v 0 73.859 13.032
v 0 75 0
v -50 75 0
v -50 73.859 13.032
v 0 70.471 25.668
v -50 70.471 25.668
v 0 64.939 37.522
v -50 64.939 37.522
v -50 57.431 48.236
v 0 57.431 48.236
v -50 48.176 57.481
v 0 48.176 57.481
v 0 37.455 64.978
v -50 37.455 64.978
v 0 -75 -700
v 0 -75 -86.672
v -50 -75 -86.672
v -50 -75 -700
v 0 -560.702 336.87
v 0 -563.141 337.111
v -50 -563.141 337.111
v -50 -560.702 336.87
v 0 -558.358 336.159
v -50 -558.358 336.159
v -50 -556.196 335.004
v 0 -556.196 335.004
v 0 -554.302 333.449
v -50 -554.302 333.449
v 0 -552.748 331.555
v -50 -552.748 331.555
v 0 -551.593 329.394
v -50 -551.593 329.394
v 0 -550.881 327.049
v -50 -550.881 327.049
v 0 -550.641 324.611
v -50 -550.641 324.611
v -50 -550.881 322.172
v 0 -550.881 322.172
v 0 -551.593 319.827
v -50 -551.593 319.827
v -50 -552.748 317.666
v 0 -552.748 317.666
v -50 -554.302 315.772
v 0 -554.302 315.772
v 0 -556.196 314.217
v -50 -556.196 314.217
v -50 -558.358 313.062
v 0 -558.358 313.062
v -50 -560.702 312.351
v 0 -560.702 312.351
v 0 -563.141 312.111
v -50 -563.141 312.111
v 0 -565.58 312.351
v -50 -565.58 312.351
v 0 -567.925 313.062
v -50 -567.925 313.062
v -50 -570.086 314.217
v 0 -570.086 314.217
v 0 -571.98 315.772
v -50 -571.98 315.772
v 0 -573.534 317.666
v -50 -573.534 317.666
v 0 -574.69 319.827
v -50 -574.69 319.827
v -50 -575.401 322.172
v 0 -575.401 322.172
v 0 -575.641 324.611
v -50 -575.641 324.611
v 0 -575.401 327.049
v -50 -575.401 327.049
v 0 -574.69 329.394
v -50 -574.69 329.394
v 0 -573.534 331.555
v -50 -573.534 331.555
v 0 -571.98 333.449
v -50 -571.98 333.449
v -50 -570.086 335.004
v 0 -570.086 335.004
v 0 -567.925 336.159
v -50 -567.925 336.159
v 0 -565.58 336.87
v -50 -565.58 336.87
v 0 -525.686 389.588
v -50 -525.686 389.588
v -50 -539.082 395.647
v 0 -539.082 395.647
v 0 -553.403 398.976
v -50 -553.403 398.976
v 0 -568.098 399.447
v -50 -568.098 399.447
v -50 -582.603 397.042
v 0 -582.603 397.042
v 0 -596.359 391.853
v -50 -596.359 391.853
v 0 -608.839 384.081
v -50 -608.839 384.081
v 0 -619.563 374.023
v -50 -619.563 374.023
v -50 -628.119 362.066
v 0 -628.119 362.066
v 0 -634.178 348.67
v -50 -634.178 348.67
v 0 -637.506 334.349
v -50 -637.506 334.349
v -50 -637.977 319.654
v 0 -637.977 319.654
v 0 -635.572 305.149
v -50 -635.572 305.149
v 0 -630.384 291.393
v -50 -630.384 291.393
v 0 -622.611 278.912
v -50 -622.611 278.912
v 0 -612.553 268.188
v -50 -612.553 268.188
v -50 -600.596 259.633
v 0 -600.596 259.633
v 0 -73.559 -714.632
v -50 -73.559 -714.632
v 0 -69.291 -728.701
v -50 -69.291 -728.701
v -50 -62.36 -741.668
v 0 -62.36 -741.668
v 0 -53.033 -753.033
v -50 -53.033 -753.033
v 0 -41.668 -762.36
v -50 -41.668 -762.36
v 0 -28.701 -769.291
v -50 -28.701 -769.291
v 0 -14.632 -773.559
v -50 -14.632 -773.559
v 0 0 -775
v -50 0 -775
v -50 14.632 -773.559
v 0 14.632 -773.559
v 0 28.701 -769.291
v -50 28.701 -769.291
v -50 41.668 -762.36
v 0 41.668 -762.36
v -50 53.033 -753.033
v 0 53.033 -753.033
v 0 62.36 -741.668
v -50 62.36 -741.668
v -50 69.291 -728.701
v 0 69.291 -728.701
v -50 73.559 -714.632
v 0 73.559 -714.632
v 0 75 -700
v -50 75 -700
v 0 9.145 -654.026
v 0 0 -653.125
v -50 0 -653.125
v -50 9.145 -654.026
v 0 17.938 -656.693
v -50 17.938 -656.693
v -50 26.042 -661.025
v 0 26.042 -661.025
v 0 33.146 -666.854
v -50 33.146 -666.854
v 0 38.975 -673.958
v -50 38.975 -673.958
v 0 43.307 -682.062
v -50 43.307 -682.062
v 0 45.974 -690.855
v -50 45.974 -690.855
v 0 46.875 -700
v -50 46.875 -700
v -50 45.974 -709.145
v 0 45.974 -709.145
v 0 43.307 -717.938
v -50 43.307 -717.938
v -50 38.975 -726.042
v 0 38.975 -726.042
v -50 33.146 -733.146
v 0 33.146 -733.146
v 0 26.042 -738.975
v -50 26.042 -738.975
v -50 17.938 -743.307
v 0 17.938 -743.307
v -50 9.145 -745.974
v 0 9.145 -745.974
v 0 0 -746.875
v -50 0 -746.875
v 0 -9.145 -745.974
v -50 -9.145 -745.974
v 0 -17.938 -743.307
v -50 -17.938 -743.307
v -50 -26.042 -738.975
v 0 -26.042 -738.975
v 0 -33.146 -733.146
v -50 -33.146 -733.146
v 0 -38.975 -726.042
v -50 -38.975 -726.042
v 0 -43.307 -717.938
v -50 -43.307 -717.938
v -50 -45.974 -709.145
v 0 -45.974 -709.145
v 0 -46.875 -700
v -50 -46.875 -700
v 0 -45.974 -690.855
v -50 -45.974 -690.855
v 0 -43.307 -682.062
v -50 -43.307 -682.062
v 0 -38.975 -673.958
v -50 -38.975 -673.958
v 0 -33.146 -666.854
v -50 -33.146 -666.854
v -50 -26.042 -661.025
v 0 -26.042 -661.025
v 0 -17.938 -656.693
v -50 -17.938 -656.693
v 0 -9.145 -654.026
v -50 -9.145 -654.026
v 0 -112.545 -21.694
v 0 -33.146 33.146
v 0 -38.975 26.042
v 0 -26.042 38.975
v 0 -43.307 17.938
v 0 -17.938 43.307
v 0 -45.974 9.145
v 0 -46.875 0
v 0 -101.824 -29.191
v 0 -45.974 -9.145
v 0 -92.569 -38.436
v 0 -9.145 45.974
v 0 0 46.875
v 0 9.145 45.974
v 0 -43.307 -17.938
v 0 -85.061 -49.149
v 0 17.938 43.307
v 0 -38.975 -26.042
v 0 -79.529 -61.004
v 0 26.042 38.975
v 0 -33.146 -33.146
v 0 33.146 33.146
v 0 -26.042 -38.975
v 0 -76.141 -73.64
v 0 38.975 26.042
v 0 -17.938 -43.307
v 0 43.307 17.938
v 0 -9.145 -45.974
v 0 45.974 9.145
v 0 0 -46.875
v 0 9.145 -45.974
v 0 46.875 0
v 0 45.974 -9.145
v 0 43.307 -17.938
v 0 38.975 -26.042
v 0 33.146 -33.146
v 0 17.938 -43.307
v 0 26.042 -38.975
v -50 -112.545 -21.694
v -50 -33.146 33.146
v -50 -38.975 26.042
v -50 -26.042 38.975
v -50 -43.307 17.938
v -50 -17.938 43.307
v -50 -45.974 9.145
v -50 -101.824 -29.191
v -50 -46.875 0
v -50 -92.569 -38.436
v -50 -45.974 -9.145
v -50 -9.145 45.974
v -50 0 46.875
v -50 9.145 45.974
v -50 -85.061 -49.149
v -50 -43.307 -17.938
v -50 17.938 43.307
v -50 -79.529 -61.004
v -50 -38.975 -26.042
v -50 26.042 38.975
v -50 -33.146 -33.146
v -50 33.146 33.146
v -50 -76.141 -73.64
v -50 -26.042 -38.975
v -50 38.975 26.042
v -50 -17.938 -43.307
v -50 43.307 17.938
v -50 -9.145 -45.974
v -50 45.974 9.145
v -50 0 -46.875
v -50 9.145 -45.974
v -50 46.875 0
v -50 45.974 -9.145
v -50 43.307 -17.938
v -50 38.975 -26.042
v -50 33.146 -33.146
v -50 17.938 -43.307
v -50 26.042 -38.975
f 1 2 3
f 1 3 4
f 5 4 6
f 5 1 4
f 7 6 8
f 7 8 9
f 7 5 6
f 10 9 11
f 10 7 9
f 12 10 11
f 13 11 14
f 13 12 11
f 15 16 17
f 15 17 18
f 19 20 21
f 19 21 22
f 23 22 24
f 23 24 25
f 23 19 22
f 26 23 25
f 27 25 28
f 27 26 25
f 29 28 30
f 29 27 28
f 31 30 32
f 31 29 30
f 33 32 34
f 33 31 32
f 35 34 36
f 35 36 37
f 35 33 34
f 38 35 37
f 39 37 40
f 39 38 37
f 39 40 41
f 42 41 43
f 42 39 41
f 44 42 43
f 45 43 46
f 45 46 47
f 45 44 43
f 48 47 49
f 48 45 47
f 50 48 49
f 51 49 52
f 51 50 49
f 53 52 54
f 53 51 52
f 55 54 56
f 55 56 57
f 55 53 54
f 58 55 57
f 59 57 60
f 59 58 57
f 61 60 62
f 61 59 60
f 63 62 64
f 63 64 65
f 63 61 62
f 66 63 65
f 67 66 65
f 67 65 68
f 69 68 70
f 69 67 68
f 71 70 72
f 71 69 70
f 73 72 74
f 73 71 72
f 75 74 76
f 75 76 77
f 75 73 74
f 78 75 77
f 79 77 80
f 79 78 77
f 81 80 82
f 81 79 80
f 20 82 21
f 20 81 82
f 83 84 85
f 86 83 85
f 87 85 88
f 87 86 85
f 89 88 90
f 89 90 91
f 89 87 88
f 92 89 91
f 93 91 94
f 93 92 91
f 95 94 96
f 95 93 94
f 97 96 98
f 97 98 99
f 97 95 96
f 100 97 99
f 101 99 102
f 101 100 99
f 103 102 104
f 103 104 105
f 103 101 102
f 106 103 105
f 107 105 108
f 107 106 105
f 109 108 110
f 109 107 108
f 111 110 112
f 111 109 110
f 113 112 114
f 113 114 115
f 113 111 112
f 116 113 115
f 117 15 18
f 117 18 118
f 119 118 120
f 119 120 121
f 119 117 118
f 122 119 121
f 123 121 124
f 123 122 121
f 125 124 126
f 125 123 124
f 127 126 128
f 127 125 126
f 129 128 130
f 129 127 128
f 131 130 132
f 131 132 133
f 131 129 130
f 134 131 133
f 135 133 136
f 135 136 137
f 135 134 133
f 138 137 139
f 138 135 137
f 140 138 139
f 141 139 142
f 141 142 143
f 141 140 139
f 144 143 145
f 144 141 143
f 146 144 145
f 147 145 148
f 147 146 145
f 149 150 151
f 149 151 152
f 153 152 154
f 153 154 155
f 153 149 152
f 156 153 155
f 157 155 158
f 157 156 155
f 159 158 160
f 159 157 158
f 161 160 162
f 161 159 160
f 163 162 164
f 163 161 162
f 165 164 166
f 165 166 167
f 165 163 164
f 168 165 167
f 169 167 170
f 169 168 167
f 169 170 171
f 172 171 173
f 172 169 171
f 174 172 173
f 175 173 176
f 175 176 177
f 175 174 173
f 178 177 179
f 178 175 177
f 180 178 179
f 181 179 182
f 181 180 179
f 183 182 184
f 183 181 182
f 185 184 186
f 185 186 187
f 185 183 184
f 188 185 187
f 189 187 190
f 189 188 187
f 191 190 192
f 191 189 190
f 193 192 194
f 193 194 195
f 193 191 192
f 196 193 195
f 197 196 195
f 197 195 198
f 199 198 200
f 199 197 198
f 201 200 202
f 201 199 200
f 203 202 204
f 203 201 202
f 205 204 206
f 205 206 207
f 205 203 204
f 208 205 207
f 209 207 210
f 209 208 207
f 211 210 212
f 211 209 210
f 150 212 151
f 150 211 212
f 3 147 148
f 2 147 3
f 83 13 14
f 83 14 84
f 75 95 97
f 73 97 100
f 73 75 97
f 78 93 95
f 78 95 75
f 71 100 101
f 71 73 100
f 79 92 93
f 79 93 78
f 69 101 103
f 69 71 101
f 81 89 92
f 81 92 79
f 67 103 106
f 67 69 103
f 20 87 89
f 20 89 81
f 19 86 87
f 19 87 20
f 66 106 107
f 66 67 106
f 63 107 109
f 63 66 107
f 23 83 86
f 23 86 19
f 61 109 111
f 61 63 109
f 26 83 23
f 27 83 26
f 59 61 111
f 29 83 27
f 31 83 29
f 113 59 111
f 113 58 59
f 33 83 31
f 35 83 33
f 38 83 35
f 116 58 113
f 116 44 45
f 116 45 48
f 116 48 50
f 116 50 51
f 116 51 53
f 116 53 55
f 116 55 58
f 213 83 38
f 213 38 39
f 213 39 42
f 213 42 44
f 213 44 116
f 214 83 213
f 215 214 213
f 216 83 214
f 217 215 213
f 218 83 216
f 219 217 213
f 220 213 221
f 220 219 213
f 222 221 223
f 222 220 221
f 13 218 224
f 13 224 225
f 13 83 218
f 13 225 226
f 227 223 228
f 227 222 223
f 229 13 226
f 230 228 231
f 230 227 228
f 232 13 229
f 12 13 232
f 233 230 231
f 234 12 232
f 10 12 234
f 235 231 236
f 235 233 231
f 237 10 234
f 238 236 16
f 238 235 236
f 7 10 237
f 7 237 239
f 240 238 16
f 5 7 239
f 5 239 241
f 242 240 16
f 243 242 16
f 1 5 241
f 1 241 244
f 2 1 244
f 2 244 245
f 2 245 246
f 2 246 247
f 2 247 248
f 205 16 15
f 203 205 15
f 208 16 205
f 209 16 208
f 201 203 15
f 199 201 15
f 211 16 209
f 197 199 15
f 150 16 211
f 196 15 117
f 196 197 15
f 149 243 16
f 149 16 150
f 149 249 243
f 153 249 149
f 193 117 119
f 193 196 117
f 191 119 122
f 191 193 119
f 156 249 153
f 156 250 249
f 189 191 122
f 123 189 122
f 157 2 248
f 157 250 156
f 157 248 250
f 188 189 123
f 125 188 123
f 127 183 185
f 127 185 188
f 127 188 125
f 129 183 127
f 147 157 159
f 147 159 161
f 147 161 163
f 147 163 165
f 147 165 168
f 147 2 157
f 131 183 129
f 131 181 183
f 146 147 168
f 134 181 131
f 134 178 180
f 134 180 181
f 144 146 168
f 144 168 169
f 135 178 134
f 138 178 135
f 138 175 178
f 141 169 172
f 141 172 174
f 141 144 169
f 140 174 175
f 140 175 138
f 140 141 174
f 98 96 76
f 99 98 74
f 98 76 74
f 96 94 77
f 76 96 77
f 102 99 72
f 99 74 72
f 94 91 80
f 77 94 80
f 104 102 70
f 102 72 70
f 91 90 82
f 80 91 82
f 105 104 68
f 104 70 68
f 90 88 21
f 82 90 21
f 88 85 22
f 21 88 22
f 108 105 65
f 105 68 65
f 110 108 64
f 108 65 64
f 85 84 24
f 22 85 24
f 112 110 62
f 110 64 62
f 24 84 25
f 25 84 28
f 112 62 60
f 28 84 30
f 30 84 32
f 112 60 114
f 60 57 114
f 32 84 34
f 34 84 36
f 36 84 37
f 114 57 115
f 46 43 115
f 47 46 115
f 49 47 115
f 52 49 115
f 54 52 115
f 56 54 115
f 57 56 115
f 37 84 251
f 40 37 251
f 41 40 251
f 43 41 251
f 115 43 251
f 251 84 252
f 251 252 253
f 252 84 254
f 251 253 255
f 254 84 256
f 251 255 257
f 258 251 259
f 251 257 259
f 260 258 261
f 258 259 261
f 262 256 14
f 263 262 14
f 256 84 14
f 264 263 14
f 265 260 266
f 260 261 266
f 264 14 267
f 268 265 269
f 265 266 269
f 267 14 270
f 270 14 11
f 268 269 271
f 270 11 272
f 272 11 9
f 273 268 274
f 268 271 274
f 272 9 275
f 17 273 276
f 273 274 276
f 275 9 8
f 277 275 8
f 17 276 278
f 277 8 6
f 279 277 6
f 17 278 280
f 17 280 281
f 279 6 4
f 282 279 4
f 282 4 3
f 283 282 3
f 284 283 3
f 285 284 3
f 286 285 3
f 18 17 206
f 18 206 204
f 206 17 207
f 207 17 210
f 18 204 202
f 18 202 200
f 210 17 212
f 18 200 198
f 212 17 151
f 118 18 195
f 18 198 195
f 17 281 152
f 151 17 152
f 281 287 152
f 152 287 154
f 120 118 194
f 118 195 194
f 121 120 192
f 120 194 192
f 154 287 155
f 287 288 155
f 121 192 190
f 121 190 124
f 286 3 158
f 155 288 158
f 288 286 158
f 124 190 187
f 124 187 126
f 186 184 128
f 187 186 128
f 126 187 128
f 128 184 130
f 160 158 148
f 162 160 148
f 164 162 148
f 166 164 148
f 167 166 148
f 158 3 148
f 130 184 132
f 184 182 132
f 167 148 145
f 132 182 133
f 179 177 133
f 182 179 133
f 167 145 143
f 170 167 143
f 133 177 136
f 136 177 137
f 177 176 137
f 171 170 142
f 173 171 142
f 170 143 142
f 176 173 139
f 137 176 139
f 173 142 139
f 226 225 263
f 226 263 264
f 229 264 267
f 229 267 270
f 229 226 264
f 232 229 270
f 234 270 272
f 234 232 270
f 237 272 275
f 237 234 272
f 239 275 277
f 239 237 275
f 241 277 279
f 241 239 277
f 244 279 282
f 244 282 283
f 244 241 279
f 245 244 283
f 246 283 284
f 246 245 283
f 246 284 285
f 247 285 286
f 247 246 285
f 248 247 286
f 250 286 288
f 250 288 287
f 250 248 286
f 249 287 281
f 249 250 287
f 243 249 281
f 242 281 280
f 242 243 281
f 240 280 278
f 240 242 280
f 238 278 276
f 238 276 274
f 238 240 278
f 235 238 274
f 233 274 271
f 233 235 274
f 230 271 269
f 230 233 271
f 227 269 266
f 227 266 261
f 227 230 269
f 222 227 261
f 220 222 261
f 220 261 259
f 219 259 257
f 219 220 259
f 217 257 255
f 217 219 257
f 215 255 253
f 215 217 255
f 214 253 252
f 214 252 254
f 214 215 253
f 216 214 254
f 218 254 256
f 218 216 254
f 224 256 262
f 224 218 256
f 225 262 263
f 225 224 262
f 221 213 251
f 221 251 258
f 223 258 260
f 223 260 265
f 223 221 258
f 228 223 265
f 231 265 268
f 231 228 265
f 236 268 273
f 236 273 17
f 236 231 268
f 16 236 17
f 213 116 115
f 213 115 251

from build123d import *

# Parameters (mm, degrees)
SKETCH1_R           = 46.875
SKETCH1_R_2         = 12.5
BOSS_EXTRUDE1_DEPTH = 50


with BuildPart() as part:
    # Sketch1 → Boss-Extrude1 (new body)
    with BuildSketch(Plane.ZY):
        with BuildLine():
            Line((-86.671705253, -75), (-700, -75))
            ThreePointArc((-700, -75), (-775, 0), (-700, 75))
            Line((-700, 75), (0, 75))
            ThreePointArc((0, 75), (37.522455225, 64.938935577), (64.977821402, 37.455076103))
            Line((64.977821402, 37.455076103), (389.588480961, -525.686042712))
            ThreePointArc((389.588480961, -525.686042712), (362.065735663, -628.118940217), (259.632838158, -600.596194918))
            Line((259.632838158, -600.596194918), (-21.693883852, -112.544923897))
            ThreePointArc((-21.693883852, -112.544923897), (-49.149250028, -85.061064423), (-86.671705253, -75))
        make_face()
        with Locations((-700, 0)):
            Circle(SKETCH1_R, mode=Mode.SUBTRACT)
        Circle(SKETCH1_R, mode=Mode.SUBTRACT)
        with Locations((324.61065956, -563.141118815)):
            Circle(SKETCH1_R_2, mode=Mode.SUBTRACT)
    extrude(amount=BOSS_EXTRUDE1_DEPTH)


solid = part.part
